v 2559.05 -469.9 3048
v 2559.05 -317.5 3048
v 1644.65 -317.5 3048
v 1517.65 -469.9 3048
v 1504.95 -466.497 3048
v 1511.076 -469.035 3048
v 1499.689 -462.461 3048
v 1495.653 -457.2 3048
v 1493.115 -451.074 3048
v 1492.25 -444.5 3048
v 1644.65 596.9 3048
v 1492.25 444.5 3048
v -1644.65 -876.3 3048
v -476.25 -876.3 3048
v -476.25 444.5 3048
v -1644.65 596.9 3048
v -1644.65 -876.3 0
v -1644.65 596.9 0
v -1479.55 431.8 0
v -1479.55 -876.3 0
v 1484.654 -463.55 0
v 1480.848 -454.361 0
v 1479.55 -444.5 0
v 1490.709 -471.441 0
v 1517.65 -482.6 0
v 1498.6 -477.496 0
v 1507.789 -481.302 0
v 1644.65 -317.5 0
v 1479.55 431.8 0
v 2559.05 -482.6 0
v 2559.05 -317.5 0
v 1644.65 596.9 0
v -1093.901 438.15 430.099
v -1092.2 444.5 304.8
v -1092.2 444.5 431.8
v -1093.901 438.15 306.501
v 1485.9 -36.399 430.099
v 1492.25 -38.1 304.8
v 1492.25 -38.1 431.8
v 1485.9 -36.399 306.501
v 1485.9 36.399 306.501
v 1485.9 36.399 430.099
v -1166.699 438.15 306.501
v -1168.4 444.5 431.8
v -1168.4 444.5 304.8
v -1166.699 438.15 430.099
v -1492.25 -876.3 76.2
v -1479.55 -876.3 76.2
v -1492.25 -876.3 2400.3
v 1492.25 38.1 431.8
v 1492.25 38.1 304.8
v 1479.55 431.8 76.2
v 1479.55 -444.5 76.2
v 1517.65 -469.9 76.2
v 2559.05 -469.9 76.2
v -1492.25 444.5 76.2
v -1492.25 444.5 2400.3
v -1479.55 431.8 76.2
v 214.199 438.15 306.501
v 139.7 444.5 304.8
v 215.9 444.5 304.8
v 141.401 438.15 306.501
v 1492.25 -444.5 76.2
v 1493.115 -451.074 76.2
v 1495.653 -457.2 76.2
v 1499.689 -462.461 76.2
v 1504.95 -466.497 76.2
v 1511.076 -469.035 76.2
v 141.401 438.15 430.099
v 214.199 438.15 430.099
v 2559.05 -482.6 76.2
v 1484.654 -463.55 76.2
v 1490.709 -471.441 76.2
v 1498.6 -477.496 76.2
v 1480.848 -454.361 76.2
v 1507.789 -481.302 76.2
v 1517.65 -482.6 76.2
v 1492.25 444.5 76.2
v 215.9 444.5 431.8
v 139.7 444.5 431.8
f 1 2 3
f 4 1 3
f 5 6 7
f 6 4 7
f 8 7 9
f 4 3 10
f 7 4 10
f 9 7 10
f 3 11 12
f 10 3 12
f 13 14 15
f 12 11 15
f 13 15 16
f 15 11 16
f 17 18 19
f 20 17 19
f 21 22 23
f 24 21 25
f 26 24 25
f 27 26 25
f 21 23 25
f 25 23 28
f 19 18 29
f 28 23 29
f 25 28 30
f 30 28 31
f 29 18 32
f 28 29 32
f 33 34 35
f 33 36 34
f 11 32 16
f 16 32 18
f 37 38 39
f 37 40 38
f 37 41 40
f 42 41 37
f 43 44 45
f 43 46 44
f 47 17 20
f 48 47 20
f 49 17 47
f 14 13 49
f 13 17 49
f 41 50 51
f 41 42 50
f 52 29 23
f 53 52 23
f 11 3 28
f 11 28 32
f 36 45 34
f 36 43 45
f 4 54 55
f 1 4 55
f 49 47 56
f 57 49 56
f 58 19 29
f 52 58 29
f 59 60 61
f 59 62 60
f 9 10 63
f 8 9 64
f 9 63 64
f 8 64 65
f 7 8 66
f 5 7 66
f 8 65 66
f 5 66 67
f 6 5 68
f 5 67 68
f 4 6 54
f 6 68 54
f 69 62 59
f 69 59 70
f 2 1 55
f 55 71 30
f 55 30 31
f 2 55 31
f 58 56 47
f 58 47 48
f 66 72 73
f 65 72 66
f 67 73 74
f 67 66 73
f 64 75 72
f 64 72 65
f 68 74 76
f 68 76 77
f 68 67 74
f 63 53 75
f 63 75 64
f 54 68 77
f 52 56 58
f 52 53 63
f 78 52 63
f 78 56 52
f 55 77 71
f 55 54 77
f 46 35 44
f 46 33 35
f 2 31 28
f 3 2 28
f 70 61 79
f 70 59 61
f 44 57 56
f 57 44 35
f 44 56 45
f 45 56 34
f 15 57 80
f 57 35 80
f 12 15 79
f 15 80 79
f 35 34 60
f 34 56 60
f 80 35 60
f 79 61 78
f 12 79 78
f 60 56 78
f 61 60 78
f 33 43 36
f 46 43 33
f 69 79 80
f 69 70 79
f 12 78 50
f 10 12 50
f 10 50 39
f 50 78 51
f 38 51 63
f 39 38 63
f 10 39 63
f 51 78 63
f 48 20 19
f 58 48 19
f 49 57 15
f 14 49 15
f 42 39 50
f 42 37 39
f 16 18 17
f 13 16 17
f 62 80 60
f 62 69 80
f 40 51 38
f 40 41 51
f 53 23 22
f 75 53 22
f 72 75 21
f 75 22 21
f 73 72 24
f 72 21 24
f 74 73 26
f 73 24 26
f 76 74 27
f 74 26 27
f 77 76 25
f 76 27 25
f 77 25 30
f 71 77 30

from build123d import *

# Parameters (mm, degrees)
F1_DEPTH = 3048
F2_DEPTH = 76.2
F3_W     = 76.2
F3_H     = 127
F4_DEPTH = 6.35
F4_TAPER = 15
F5_W     = 76.2
F5_H     = 127
F6_DEPTH = 6.35
F6_TAPER = 15
F8_DEPTH = 1320.8


with BuildPart() as f1:
    # F0 (on Top) → F1 (new body)
    with BuildSketch(Plane.XY):
        with BuildLine():
            Line((-1492.25, 444.5), (1492.25, 444.5))
            Line((1492.25, 444.5), (1492.25, -444.5))
            ThreePointArc((1492.25, -444.5), (1499.6894877579, -462.4605122421), (1517.65, -469.9))
            Line((1517.65, -469.9), (2559.05, -469.9))
            Line((2559.05, -469.9), (2559.05, -317.5))
            Line((2559.05, -317.5), (1644.65, -317.5))
            Line((1644.65, -317.5), (1644.65, 596.9))
            Line((1644.65, 596.9), (-1644.65, 596.9))
            Line((-1644.65, 596.9), (-1644.65, -876.3))
            Line((-1644.65, -876.3), (-1492.25, -876.3))
            Line((-1492.25, -876.3), (-1492.25, -444.5))
            Line((-1492.25, -444.5), (-1492.25, 444.5))
        make_face()
    extrude(amount=F1_DEPTH)

    # F0 (on Top) → F2 (join)
    with BuildSketch(Plane.XY):
        with BuildLine():
            Line((1492.25, -444.5), (1492.25, 444.5))
            Line((1492.25, 444.5), (-1492.25, 444.5))
            Line((-1492.25, 444.5), (-1492.25, -444.5))
            Line((-1492.25, -444.5), (-1492.25, -876.3))
            Line((-1492.25, -876.3), (-1479.55, -876.3))
            Line((-1479.55, -876.3), (-1479.55, 431.8))
            Line((-1479.55, 431.8), (1479.55, 431.8))
            Line((1479.55, 431.8), (1479.55, -444.5))
            ThreePointArc((1479.55, -444.5), (1490.7092316368, -471.4407683632), (1517.65, -482.6))
            Line((1517.65, -482.6), (2559.05, -482.6))
            Line((2559.05, -482.6), (2559.05, -469.9))
            Line((2559.05, -469.9), (1517.65, -469.9))
            ThreePointArc((1517.65, -469.9), (1499.6894877579, -462.4605122421), (1492.25, -444.5))
        make_face()
    extrude(amount=F2_DEPTH)

    # F3 (on face) → F4 (join)
    with BuildSketch(Plane.XZ.offset(-444.5)):
        with Locations((-1130.3, 368.3)):
            Rectangle(F3_W, F3_H)
        with Locations((177.8, 368.3)):
            Rectangle(F3_W, F3_H)
    extrude(amount=F4_DEPTH, taper=F4_TAPER)

    # F5 (on face) → F6 (join)
    with BuildSketch(Plane(origin=(1492.25, 0, 0), x_dir=(0, -1, 0), z_dir=(-1, 0, 0))):
        with Locations((0, 368.3)):
            Rectangle(F5_W, F5_H)
    extrude(amount=F6_DEPTH, taper=F6_TAPER)

    # F7 (on face) → F8 (join, through all)
    with BuildSketch(Plane.XZ.offset(-444.5)):
        Polygon((-476.25, 3048), (-1492.25, 3048), (-1492.25, 2400.3), align=None)
    extrude(amount=F8_DEPTH)


solid = f1.part
